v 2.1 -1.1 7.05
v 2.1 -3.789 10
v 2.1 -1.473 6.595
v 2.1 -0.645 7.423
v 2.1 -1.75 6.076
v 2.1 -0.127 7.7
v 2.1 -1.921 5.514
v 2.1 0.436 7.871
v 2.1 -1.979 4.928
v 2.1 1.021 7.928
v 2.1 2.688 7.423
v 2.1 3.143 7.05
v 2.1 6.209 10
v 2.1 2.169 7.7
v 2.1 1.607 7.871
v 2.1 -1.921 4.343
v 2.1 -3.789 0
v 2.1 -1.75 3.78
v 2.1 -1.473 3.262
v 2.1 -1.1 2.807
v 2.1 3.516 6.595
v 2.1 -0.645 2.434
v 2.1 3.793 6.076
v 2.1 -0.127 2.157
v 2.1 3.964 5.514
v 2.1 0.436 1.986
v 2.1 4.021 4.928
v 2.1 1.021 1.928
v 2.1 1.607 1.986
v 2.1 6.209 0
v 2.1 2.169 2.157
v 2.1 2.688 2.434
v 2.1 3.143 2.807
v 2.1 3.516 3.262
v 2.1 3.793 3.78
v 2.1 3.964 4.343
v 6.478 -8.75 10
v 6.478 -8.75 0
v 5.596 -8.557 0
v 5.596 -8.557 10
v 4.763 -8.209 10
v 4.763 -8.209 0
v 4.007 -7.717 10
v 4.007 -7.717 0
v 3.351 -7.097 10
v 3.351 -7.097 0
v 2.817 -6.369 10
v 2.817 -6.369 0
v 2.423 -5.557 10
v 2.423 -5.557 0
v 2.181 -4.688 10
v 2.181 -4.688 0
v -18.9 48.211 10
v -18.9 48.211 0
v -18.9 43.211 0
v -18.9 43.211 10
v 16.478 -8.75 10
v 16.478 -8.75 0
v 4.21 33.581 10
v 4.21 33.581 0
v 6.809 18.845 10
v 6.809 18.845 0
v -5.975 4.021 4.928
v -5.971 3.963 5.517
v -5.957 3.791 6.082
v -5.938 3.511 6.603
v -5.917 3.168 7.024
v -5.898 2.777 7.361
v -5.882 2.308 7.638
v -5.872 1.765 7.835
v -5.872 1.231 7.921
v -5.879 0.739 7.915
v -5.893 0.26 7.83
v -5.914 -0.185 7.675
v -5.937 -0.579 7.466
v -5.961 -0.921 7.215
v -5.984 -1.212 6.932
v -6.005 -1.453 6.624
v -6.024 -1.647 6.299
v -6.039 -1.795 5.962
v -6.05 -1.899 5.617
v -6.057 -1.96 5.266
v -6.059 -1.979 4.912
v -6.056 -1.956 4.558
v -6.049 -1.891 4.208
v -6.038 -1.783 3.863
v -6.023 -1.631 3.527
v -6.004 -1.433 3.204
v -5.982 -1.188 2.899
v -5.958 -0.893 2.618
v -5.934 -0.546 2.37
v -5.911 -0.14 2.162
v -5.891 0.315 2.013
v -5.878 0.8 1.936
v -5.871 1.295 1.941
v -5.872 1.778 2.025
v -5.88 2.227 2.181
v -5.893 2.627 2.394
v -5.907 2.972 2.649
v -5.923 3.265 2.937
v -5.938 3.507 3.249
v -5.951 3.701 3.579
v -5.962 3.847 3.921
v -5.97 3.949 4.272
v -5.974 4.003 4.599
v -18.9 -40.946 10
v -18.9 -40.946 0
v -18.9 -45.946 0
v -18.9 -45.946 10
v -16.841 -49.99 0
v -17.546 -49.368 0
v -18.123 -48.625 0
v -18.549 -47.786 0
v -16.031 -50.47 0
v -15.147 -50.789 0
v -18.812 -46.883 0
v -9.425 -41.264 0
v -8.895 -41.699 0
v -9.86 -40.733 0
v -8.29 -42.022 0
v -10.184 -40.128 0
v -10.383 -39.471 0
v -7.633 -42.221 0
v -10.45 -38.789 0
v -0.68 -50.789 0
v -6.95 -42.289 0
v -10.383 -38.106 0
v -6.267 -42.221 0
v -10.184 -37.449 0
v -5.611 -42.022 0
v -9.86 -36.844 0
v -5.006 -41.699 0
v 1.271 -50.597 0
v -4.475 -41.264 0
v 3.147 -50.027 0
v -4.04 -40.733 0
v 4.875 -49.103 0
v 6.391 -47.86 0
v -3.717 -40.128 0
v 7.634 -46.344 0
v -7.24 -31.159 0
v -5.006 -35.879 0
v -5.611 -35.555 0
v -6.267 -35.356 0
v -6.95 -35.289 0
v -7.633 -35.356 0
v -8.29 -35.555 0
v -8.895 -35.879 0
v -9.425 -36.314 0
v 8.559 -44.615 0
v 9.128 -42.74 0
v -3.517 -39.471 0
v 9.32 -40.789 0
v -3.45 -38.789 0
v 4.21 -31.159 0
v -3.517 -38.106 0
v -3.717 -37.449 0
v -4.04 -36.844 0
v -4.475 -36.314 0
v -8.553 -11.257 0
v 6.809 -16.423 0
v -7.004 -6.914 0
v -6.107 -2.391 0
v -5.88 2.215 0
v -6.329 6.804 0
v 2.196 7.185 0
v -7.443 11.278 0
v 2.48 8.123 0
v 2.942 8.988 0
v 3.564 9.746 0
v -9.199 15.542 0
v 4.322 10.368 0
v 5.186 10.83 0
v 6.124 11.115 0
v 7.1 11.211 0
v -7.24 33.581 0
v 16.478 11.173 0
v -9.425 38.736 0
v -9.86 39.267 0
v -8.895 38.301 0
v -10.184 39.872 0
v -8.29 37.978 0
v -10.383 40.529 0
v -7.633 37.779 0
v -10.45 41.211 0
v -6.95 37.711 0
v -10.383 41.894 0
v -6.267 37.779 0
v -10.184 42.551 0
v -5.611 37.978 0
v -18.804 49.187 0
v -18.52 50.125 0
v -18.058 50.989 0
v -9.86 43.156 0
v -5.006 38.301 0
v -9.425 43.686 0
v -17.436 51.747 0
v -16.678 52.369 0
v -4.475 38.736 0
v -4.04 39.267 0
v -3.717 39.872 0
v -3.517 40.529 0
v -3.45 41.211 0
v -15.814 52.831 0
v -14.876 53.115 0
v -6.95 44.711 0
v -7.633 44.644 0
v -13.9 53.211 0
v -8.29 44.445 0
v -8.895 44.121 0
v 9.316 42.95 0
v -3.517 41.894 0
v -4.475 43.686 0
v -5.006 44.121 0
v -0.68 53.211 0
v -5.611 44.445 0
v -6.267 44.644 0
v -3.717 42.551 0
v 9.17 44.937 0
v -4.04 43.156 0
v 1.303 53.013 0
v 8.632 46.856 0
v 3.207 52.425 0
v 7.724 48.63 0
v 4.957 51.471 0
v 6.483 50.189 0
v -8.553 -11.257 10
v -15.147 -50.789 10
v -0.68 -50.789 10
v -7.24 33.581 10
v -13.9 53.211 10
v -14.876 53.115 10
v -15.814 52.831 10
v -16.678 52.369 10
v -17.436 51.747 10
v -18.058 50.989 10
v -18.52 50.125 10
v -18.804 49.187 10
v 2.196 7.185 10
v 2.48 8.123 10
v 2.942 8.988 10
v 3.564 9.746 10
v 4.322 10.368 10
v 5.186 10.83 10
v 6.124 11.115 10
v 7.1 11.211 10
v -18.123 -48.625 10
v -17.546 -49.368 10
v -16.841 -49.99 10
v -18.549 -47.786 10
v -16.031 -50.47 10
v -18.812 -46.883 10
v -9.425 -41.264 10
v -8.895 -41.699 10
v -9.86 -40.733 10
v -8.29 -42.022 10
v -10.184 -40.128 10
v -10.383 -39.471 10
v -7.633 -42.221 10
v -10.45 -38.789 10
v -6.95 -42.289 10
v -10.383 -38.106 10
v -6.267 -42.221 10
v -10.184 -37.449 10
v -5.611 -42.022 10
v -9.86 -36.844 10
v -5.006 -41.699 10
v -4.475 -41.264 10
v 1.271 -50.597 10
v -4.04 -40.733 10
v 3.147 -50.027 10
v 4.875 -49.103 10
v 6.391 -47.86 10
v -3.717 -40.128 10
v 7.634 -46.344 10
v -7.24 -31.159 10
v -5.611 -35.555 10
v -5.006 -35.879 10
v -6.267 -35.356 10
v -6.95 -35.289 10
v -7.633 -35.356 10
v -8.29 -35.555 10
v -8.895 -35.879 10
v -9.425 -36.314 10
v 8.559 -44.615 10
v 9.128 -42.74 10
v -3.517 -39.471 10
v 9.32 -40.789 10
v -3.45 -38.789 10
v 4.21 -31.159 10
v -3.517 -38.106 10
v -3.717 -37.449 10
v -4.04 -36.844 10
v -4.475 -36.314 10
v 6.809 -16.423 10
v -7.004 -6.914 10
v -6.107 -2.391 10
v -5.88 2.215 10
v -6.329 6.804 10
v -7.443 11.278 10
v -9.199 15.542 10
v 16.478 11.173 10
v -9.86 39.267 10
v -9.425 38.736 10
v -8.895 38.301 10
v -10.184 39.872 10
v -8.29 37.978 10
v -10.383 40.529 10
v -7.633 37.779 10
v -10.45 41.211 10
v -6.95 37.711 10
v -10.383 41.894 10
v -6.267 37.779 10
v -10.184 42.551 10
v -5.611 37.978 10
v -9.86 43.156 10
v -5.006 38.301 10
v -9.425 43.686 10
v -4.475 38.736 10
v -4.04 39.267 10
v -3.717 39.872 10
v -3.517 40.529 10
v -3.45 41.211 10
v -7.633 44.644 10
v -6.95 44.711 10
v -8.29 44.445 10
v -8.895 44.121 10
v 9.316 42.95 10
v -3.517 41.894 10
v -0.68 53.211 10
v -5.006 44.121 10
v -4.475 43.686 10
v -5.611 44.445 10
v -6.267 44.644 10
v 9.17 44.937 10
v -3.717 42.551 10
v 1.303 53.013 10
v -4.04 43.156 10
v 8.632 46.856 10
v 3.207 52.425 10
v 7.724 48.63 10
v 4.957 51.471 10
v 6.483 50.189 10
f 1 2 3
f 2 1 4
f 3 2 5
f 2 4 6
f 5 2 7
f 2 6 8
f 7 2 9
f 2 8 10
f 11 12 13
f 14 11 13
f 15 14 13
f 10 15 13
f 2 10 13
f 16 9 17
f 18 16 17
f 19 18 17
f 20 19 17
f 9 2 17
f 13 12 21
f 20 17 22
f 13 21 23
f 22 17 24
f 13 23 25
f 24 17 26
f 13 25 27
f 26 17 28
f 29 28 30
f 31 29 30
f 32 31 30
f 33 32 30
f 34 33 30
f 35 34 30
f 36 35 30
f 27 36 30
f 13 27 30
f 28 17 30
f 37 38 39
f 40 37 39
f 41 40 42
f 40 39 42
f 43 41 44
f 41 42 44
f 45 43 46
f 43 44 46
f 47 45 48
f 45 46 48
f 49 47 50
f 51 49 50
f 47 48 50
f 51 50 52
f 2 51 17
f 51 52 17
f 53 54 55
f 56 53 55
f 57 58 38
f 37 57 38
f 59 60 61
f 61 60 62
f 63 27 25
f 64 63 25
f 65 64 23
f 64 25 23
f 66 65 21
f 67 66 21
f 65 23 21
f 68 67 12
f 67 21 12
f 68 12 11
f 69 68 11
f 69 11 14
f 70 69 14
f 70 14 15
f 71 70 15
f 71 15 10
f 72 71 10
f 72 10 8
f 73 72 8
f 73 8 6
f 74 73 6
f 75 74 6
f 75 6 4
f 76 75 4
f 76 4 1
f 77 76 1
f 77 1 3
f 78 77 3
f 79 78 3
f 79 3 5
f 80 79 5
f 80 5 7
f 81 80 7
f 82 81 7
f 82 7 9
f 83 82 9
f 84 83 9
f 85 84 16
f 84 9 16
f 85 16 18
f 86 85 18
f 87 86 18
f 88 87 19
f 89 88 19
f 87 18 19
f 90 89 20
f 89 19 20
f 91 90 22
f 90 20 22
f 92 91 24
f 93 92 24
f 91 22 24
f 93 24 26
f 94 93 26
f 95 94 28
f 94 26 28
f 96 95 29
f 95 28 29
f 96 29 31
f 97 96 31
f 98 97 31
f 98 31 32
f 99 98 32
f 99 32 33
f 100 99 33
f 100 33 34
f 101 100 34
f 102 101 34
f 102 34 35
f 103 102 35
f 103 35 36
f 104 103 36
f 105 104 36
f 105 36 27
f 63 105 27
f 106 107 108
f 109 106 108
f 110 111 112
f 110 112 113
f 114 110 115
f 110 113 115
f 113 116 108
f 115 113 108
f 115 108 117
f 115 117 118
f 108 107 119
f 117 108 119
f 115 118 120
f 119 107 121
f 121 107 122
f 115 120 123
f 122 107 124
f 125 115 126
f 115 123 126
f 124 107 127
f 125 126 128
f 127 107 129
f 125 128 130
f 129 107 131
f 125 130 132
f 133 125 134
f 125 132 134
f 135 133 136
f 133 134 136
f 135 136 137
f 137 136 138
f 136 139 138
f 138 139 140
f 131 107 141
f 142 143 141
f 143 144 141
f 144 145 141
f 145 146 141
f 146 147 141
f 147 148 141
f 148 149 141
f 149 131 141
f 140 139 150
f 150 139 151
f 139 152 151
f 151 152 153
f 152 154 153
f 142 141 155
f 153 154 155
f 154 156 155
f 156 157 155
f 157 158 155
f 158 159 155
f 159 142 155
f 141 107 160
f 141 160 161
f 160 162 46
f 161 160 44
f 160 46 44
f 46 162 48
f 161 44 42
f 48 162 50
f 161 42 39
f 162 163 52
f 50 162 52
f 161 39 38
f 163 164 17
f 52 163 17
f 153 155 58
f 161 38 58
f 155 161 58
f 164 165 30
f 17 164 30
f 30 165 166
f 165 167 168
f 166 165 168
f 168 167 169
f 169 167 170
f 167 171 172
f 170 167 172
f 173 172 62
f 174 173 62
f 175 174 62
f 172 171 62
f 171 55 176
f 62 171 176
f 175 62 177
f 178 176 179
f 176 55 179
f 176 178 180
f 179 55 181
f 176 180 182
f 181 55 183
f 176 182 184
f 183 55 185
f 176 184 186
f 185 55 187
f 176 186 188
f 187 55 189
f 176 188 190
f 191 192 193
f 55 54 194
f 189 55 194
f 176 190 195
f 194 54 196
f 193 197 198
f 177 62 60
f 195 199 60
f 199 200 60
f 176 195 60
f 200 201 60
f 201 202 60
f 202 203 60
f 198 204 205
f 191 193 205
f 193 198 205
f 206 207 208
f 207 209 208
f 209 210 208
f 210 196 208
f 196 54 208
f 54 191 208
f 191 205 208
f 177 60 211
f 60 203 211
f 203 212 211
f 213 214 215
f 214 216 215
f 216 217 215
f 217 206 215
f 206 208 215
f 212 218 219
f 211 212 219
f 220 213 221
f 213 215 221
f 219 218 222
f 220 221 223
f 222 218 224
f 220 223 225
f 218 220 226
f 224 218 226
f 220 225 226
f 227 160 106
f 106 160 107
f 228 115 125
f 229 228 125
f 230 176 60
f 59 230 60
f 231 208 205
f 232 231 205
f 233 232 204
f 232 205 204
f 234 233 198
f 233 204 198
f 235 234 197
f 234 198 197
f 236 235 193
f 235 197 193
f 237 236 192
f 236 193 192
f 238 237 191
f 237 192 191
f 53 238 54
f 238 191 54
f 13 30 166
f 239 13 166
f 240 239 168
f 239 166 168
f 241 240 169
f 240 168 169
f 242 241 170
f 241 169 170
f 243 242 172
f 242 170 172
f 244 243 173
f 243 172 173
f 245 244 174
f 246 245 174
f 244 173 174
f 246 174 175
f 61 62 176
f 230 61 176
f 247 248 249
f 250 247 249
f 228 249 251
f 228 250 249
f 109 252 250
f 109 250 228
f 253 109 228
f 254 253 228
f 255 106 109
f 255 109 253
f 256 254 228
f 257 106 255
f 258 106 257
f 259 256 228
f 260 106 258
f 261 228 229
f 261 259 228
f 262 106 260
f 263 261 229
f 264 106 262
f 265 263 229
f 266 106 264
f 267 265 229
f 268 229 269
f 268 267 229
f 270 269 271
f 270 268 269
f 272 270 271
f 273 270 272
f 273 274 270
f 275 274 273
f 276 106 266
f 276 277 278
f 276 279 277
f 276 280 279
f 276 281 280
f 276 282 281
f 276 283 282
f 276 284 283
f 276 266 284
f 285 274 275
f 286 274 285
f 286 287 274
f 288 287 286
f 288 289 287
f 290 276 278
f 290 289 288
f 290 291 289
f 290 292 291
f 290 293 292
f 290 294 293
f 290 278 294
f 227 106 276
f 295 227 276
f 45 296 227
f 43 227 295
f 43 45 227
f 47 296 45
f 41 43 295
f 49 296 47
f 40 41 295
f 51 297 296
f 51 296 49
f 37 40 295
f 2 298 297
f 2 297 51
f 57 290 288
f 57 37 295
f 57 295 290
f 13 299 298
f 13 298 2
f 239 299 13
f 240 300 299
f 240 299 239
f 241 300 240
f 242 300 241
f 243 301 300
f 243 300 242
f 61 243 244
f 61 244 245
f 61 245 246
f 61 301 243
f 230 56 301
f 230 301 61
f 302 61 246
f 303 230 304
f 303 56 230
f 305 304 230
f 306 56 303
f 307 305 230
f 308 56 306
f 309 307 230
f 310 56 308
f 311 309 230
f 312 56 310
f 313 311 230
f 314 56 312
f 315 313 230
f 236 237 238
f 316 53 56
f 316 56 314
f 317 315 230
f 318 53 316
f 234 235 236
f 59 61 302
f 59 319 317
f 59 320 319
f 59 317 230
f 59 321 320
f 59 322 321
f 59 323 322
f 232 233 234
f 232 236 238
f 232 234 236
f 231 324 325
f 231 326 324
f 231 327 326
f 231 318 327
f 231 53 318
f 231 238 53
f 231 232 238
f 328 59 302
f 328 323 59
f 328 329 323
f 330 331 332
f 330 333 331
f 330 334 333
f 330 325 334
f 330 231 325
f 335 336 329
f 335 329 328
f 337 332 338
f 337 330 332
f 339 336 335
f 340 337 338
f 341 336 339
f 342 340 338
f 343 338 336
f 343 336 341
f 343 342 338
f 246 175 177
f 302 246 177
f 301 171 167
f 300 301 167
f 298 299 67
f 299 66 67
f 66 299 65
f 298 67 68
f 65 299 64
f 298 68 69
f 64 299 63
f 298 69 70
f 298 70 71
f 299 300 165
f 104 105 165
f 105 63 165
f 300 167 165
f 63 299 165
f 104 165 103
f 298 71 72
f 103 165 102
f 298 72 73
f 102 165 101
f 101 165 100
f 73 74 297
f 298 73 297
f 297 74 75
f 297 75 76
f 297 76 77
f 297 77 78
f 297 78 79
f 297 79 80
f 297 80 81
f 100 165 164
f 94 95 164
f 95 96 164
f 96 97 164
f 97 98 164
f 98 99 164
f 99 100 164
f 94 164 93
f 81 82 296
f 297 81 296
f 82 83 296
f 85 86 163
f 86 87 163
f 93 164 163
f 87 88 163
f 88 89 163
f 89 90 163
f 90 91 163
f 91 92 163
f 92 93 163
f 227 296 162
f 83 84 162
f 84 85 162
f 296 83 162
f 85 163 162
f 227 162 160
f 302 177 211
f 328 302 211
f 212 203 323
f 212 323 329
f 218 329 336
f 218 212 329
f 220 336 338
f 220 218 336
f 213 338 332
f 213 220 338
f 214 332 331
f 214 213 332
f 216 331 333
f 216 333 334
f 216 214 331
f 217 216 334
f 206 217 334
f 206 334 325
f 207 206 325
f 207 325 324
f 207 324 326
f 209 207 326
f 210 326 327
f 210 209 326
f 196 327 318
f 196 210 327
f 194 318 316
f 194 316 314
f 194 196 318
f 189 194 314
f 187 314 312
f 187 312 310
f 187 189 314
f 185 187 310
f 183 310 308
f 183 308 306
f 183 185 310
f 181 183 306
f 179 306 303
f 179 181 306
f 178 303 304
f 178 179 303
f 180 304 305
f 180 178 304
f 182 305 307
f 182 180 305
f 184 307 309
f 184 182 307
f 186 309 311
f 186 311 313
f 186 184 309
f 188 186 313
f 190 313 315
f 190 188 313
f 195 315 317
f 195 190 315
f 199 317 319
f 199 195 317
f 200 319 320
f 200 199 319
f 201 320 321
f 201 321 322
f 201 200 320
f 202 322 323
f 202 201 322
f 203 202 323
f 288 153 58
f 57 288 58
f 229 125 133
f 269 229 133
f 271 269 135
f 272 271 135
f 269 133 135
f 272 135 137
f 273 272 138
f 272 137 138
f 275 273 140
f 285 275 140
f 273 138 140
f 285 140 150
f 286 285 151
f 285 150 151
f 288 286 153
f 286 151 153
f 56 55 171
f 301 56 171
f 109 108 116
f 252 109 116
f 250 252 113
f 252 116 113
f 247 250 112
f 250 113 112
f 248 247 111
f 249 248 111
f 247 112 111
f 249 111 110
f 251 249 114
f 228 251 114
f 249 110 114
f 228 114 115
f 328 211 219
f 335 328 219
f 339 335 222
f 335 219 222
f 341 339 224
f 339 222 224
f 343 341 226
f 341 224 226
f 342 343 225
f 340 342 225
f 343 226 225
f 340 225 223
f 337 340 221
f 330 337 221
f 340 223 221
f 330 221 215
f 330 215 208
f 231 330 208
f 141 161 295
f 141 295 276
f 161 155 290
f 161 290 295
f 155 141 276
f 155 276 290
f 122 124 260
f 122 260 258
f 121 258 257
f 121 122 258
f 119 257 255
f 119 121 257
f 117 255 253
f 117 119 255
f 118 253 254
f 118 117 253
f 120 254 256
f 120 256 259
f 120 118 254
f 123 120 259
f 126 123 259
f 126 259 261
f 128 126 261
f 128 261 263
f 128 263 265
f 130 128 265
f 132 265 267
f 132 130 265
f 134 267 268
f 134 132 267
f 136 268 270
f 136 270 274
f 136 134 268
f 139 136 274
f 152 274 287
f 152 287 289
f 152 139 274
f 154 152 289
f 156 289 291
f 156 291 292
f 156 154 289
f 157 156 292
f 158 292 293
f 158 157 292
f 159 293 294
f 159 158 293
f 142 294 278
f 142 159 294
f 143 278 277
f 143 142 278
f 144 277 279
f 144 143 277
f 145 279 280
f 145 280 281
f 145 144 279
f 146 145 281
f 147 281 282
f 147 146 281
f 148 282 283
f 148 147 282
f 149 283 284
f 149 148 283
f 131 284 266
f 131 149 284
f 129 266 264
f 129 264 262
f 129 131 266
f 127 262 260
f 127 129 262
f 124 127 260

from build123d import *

# Parameters (mm, degrees)
ESBO_O1_R                = 3.5
RESSALTO_EXTRUS_O1_DEPTH = 10
ESBO_O2_R                = 3
CORTE_EXTRUS_O1_DEPTH    = 10


with BuildPart() as part:
    # Esboço1 → Ressalto-extrusão1 (new body)
    with BuildSketch(Plane.XY):
        with BuildLine():
            Line((16.477791125, 11.172502957), (9.316356929, 42.949783159))
            ThreePointArc((9.316356929, 42.949783159), (6.482723548, 50.189321152), (-0.680221872, 53.211340576))
            Line((-0.680221872, 53.211340576), (-13.900221872, 53.211340576))
            ThreePointArc((-13.900221872, 53.211340576), (-17.435755778, 51.746874482), (-18.900221872, 48.211340576))
            Line((-18.900221872, 48.211340576), (-18.900221872, 43.211340576))
            Line((-18.900221872, 43.211340576), (-9.19947784, 15.541635731))
            ThreePointArc((-9.19947784, 15.541635731), (-5.879873215, 2.214686326), (-8.553040247, -11.256821879))
            Line((-8.553040247, -11.256821879), (-18.900221872, -40.946499789))
            Line((-18.900221872, -40.946499789), (-18.900221872, -45.946499789))
            ThreePointArc((-18.900221872, -45.946499789), (-17.851927459, -49.009835055), (-15.146612691, -50.788659424))
            Line((-15.146612691, -50.788659424), (-13.900221872, -50.788659424))
            Line((-13.900221872, -50.788659424), (-0.680221872, -50.788659424))
            ThreePointArc((-0.680221872, -50.788659424), (6.39084594, -47.859727235), (9.319778128, -40.788659424))
            Line((9.319778128, -40.788659424), (16.477791125, -8.749821804))
            Line((16.477791125, -8.749821804), (6.477791125, -8.749821804))
            ThreePointArc((6.477791125, -8.749821804), (3.350782595, -7.096987172), (2.099778128, -3.788659424))
            Line((2.099778128, -3.788659424), (2.099778128, 6.209261385))
            ThreePointArc((2.099778128, 6.209261385), (3.564118149, 9.745530472), (7.099778128, 11.211340576))
            Line((7.099778128, 11.211340576), (16.477791125, 11.172502957))
        make_face()
        with Locations((-6.950221872, 41.211340576)):
            Circle(ESBO_O1_R, mode=Mode.SUBTRACT)
        with Locations(Location((-6.950221872, -38.788659424, 0), (0, 0, 180))):
            Circle(ESBO_O1_R, mode=Mode.SUBTRACT)
        Polygon((-7.240418913, 33.581340576), (4.209581087, 33.581340576), (6.808835229, 18.845396153), align=None, mode=Mode.SUBTRACT)
        Polygon((4.209581087, -31.158659424), (6.808835229, -16.422715), (-7.240418913, -31.158659424), align=None, mode=Mode.SUBTRACT)
    extrude(amount=RESSALTO_EXTRUS_O1_DEPTH)

    # Esboço2 → Corte-extrusão1 (cut)
    with BuildSketch(Plane(origin=(2.099778128, 0, 0), x_dir=(0, 0, -1), z_dir=(1, 0, 0))):
        with Locations(Location((-4.928277881, 1.02125064, 0), (0, 0, 90))):
            Circle(ESBO_O2_R)
    extrude(amount=-CORTE_EXTRUS_O1_DEPTH, mode=Mode.SUBTRACT)


solid = part.part
